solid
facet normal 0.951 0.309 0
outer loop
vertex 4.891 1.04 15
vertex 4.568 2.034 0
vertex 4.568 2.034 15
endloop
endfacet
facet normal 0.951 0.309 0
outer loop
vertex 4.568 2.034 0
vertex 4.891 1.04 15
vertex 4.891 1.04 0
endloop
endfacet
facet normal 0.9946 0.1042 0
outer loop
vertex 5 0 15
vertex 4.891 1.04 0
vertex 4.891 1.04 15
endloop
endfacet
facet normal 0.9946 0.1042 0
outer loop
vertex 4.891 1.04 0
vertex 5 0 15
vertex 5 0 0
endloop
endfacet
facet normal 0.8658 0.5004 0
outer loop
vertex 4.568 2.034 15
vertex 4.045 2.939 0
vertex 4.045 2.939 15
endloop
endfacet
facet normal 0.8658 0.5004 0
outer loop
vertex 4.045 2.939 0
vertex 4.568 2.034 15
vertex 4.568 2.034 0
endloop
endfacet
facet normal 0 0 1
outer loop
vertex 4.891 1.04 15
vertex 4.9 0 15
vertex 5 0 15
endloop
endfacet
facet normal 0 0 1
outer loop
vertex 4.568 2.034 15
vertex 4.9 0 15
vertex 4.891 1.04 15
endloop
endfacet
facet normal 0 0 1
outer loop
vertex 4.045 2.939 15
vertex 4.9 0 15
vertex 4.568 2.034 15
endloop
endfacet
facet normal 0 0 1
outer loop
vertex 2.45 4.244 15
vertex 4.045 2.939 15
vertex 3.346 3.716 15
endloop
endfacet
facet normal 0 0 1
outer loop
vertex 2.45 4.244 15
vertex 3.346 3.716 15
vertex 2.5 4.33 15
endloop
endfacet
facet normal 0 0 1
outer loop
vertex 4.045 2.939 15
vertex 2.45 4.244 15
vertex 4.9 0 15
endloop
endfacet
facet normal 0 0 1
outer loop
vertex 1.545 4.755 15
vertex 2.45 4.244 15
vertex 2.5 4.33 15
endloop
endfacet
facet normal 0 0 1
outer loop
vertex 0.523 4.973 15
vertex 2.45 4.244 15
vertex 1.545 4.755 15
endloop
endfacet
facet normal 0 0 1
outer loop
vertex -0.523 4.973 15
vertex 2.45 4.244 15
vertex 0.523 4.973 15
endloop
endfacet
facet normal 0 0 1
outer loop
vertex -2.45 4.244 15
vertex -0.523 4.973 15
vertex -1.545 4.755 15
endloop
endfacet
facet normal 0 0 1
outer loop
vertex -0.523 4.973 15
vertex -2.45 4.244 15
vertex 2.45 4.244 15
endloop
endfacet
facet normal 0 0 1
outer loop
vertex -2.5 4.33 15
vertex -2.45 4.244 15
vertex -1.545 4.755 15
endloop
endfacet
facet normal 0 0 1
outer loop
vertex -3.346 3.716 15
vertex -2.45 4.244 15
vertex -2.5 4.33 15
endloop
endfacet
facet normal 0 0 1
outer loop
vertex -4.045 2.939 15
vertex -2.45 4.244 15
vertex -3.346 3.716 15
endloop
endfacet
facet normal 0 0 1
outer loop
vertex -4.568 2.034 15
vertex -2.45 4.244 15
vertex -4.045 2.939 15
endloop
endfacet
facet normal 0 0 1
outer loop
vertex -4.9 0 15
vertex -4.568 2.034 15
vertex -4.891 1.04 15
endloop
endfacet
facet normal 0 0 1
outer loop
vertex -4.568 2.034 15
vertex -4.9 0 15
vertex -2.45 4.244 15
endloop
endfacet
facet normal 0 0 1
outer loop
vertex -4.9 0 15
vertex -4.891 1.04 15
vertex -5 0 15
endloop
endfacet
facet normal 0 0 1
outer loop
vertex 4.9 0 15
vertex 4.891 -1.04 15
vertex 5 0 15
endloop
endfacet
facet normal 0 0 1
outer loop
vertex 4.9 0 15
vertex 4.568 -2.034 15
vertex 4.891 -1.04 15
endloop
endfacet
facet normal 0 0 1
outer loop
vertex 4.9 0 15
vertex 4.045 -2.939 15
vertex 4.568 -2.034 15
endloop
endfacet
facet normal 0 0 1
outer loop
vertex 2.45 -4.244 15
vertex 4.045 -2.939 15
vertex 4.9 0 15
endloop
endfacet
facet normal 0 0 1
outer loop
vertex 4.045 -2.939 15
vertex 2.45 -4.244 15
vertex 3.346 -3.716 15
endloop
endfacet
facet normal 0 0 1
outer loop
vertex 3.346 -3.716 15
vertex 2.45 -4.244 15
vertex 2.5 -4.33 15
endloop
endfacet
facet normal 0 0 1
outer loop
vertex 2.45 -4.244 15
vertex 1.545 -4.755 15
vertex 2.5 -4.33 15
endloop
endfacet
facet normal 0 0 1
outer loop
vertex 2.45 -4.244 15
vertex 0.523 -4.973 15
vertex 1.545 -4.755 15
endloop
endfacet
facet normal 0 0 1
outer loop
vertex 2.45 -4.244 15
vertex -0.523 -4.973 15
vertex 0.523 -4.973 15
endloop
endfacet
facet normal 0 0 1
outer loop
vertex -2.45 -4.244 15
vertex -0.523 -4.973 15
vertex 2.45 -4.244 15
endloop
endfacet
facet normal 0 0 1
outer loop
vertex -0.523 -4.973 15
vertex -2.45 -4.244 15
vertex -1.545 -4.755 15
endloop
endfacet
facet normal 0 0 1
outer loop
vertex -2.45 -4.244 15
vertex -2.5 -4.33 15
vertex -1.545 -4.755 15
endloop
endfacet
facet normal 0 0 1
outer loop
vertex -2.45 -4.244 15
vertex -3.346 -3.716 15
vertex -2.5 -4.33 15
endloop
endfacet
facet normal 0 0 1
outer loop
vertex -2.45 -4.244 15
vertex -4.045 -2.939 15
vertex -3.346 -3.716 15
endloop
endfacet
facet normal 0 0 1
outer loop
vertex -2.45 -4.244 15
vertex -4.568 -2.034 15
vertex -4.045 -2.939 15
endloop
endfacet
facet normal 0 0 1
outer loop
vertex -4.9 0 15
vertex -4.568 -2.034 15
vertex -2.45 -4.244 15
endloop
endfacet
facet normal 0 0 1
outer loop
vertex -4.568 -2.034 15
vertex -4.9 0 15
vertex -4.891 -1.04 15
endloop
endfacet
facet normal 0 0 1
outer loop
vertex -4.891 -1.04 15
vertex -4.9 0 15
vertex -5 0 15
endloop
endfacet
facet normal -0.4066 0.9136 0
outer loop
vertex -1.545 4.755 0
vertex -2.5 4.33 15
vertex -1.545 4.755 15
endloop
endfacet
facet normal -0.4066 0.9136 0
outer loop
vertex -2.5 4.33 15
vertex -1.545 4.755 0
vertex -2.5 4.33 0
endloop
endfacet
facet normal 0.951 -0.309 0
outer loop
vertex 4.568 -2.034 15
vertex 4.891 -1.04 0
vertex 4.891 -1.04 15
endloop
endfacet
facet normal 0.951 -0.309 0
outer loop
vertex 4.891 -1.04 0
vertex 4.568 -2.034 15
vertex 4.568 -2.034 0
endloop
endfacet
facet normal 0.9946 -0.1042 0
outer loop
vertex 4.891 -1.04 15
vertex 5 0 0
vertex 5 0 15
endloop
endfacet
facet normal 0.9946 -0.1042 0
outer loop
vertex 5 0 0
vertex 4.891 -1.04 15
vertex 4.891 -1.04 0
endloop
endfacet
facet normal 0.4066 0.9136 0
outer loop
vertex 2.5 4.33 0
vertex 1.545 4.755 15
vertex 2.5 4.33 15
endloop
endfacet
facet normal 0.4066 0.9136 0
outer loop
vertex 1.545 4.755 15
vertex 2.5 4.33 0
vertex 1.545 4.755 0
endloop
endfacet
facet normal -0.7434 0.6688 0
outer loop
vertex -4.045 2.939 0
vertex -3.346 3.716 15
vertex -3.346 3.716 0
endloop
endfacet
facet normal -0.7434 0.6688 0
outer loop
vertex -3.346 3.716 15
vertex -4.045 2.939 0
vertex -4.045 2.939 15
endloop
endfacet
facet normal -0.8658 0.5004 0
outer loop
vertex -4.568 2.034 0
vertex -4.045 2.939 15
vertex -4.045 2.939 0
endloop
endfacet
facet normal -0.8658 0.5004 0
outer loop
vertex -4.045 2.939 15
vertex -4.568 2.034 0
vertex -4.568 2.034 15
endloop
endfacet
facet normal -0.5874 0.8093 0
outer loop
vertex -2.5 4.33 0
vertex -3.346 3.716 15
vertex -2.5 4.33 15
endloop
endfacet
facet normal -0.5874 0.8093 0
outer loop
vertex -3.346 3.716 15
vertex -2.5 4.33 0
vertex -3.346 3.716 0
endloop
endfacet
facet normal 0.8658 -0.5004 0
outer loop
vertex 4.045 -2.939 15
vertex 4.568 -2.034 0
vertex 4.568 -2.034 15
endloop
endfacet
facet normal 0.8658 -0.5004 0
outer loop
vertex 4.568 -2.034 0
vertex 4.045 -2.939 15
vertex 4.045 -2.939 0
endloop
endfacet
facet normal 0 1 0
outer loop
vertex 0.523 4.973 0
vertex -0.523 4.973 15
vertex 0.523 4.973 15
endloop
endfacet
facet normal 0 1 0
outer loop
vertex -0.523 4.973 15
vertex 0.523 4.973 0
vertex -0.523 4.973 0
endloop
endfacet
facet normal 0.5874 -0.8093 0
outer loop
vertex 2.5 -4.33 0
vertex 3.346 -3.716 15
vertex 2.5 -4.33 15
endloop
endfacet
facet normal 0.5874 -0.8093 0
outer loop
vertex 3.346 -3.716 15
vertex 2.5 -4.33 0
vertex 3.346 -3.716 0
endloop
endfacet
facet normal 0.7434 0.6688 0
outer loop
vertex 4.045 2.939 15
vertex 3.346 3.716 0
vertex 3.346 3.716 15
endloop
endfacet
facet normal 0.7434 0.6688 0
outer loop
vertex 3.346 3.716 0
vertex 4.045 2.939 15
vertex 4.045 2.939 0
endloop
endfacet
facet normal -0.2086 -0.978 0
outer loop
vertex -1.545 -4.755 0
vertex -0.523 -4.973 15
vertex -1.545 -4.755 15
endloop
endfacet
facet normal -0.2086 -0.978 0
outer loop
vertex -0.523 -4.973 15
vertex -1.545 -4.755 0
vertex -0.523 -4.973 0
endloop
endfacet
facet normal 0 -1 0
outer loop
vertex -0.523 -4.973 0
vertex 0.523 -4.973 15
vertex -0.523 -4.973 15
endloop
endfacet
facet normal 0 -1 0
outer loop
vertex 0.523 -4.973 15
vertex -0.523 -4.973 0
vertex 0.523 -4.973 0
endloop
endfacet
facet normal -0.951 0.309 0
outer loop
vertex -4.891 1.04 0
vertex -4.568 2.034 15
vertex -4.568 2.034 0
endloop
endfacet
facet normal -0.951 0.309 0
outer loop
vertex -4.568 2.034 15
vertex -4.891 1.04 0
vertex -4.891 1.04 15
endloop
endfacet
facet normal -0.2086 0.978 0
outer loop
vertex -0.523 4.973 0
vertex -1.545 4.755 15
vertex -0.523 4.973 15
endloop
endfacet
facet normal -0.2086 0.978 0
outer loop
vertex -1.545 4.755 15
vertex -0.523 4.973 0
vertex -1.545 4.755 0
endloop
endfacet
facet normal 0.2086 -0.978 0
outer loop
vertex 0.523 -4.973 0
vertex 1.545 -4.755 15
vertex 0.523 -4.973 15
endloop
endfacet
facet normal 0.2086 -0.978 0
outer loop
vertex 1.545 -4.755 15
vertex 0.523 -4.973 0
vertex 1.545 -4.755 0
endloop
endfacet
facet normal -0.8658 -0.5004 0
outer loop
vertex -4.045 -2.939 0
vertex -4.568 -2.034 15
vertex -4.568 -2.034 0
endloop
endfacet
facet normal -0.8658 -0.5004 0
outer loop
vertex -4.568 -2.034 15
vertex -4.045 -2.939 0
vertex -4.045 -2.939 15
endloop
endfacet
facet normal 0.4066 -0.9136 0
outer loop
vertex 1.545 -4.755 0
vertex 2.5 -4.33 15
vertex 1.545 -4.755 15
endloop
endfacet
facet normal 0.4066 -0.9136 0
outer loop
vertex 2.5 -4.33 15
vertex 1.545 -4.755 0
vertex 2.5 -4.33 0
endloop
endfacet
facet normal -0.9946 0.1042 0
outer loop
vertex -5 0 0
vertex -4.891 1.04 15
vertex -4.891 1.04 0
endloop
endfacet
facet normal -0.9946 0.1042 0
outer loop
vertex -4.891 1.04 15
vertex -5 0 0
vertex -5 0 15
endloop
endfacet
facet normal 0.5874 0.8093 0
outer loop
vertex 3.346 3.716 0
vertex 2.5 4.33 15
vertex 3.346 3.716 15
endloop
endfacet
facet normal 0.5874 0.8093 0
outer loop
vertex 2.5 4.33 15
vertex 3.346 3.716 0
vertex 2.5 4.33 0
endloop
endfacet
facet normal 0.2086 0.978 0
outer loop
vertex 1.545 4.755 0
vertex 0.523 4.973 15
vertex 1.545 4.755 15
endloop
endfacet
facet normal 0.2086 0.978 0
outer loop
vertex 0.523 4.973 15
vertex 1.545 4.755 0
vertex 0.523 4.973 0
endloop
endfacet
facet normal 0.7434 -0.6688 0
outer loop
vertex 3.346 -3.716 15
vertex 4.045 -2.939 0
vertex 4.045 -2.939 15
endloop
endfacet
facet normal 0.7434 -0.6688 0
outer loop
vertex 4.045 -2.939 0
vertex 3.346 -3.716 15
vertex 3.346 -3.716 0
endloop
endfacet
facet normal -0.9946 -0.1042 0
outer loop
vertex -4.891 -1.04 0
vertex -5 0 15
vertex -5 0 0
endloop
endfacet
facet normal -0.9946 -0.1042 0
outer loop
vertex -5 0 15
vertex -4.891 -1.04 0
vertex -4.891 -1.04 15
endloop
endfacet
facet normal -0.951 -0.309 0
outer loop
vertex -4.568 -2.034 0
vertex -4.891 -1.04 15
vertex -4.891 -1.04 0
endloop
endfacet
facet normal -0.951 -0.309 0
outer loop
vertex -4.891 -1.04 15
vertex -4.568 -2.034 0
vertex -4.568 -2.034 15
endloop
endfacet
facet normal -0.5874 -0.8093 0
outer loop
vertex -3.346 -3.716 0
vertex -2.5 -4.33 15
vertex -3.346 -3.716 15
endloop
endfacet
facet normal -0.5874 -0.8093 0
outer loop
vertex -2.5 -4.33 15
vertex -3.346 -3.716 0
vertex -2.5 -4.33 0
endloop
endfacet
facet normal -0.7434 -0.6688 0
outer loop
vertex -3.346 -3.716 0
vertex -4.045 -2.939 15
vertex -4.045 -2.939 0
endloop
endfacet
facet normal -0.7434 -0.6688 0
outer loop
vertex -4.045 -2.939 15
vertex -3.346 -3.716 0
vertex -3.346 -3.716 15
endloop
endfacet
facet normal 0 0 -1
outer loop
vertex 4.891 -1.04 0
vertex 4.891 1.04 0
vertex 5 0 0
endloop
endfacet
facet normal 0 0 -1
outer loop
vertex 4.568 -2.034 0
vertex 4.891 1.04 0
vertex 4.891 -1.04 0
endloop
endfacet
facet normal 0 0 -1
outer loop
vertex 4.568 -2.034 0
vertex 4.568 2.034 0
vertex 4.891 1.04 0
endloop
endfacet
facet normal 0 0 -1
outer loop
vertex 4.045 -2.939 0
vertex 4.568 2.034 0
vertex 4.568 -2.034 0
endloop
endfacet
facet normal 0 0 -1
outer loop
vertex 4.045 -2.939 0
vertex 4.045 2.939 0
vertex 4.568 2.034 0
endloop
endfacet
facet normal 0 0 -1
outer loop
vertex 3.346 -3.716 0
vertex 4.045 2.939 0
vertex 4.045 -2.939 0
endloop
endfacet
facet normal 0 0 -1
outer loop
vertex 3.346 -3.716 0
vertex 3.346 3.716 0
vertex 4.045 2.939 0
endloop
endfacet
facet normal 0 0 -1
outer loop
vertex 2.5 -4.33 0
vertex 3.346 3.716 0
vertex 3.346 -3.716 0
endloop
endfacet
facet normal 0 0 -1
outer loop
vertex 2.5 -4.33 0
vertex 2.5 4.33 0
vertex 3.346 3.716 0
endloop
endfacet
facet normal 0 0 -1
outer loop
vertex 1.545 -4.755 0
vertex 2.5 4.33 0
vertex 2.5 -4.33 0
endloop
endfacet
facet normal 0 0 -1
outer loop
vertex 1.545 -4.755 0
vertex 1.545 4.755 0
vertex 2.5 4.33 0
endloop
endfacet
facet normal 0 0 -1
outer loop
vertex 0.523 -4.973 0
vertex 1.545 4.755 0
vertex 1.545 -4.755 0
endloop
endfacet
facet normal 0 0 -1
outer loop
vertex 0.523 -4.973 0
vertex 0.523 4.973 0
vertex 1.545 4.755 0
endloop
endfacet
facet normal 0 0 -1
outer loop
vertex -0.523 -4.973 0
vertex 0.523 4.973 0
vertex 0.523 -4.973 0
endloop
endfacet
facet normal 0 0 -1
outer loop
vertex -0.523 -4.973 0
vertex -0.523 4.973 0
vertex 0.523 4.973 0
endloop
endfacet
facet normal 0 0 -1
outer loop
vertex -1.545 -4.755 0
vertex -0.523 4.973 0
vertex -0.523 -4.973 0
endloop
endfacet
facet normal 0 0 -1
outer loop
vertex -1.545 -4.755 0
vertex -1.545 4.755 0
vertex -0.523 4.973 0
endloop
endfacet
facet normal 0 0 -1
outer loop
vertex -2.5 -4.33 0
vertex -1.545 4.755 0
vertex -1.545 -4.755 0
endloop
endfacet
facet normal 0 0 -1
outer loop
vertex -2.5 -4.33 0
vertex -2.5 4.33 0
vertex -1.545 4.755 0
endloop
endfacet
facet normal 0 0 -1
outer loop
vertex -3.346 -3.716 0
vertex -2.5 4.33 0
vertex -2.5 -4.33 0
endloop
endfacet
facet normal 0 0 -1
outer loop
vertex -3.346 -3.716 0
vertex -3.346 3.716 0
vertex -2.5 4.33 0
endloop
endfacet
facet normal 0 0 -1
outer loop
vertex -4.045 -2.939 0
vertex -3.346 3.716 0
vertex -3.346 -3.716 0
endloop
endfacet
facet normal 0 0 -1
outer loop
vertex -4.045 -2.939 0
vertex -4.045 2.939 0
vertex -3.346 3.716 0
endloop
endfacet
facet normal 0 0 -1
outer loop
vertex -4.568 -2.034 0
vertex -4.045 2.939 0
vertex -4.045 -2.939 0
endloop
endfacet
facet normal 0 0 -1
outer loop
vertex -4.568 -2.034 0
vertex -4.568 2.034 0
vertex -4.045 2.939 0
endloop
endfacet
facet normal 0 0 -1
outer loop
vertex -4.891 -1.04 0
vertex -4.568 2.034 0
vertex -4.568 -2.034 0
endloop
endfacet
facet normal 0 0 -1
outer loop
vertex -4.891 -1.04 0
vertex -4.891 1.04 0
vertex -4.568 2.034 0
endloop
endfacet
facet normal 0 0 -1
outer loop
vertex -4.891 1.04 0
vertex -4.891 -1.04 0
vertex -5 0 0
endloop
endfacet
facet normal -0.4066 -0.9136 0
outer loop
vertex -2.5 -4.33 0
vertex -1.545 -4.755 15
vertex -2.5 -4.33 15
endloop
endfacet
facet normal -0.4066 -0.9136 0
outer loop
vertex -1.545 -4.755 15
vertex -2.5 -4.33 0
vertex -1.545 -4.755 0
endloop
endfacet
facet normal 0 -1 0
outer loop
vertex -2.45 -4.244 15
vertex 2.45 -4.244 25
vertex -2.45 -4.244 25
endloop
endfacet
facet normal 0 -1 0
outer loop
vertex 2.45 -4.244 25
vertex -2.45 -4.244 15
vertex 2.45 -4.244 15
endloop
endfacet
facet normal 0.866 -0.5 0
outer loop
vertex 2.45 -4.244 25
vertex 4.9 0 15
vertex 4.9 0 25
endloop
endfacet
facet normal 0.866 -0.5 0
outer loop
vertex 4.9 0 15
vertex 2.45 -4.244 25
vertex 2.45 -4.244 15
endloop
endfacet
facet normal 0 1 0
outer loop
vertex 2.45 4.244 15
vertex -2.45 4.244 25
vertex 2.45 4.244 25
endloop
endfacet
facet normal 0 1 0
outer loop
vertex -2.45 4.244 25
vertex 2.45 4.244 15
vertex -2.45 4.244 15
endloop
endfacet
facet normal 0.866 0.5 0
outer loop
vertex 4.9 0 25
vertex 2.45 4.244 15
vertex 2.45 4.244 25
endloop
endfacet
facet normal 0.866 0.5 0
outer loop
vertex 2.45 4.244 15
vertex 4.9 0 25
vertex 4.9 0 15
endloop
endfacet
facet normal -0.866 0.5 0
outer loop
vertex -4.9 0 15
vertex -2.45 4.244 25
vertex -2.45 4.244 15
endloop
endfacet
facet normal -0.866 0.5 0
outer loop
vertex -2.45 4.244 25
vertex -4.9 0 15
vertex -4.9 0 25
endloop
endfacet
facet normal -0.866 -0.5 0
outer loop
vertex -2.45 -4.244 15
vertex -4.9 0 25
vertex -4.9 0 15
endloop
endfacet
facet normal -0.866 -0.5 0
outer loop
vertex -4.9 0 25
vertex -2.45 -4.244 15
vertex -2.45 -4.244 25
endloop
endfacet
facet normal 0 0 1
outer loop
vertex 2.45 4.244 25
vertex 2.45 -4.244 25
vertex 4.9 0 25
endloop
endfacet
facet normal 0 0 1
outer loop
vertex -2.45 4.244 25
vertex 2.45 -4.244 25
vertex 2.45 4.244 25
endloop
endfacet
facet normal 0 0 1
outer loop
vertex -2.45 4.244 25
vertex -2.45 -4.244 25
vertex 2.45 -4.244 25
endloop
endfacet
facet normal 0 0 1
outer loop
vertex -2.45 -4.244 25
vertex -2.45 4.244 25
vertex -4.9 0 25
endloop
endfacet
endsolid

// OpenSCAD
// file: config.scad
$fs=0.5;

di_m4_t = 3.6;
di_m4_d = 4.4;

di_m4_nut = 8.5;

di_m2_t = 1.8;
// main file
include <config.scad>
module free_rotate_rod() {
    union() {
        cylinder(d=10, h=15);
        cylinder(d=9.8, h=25, $fa=70);
    }
}
free_rotate_rod();
